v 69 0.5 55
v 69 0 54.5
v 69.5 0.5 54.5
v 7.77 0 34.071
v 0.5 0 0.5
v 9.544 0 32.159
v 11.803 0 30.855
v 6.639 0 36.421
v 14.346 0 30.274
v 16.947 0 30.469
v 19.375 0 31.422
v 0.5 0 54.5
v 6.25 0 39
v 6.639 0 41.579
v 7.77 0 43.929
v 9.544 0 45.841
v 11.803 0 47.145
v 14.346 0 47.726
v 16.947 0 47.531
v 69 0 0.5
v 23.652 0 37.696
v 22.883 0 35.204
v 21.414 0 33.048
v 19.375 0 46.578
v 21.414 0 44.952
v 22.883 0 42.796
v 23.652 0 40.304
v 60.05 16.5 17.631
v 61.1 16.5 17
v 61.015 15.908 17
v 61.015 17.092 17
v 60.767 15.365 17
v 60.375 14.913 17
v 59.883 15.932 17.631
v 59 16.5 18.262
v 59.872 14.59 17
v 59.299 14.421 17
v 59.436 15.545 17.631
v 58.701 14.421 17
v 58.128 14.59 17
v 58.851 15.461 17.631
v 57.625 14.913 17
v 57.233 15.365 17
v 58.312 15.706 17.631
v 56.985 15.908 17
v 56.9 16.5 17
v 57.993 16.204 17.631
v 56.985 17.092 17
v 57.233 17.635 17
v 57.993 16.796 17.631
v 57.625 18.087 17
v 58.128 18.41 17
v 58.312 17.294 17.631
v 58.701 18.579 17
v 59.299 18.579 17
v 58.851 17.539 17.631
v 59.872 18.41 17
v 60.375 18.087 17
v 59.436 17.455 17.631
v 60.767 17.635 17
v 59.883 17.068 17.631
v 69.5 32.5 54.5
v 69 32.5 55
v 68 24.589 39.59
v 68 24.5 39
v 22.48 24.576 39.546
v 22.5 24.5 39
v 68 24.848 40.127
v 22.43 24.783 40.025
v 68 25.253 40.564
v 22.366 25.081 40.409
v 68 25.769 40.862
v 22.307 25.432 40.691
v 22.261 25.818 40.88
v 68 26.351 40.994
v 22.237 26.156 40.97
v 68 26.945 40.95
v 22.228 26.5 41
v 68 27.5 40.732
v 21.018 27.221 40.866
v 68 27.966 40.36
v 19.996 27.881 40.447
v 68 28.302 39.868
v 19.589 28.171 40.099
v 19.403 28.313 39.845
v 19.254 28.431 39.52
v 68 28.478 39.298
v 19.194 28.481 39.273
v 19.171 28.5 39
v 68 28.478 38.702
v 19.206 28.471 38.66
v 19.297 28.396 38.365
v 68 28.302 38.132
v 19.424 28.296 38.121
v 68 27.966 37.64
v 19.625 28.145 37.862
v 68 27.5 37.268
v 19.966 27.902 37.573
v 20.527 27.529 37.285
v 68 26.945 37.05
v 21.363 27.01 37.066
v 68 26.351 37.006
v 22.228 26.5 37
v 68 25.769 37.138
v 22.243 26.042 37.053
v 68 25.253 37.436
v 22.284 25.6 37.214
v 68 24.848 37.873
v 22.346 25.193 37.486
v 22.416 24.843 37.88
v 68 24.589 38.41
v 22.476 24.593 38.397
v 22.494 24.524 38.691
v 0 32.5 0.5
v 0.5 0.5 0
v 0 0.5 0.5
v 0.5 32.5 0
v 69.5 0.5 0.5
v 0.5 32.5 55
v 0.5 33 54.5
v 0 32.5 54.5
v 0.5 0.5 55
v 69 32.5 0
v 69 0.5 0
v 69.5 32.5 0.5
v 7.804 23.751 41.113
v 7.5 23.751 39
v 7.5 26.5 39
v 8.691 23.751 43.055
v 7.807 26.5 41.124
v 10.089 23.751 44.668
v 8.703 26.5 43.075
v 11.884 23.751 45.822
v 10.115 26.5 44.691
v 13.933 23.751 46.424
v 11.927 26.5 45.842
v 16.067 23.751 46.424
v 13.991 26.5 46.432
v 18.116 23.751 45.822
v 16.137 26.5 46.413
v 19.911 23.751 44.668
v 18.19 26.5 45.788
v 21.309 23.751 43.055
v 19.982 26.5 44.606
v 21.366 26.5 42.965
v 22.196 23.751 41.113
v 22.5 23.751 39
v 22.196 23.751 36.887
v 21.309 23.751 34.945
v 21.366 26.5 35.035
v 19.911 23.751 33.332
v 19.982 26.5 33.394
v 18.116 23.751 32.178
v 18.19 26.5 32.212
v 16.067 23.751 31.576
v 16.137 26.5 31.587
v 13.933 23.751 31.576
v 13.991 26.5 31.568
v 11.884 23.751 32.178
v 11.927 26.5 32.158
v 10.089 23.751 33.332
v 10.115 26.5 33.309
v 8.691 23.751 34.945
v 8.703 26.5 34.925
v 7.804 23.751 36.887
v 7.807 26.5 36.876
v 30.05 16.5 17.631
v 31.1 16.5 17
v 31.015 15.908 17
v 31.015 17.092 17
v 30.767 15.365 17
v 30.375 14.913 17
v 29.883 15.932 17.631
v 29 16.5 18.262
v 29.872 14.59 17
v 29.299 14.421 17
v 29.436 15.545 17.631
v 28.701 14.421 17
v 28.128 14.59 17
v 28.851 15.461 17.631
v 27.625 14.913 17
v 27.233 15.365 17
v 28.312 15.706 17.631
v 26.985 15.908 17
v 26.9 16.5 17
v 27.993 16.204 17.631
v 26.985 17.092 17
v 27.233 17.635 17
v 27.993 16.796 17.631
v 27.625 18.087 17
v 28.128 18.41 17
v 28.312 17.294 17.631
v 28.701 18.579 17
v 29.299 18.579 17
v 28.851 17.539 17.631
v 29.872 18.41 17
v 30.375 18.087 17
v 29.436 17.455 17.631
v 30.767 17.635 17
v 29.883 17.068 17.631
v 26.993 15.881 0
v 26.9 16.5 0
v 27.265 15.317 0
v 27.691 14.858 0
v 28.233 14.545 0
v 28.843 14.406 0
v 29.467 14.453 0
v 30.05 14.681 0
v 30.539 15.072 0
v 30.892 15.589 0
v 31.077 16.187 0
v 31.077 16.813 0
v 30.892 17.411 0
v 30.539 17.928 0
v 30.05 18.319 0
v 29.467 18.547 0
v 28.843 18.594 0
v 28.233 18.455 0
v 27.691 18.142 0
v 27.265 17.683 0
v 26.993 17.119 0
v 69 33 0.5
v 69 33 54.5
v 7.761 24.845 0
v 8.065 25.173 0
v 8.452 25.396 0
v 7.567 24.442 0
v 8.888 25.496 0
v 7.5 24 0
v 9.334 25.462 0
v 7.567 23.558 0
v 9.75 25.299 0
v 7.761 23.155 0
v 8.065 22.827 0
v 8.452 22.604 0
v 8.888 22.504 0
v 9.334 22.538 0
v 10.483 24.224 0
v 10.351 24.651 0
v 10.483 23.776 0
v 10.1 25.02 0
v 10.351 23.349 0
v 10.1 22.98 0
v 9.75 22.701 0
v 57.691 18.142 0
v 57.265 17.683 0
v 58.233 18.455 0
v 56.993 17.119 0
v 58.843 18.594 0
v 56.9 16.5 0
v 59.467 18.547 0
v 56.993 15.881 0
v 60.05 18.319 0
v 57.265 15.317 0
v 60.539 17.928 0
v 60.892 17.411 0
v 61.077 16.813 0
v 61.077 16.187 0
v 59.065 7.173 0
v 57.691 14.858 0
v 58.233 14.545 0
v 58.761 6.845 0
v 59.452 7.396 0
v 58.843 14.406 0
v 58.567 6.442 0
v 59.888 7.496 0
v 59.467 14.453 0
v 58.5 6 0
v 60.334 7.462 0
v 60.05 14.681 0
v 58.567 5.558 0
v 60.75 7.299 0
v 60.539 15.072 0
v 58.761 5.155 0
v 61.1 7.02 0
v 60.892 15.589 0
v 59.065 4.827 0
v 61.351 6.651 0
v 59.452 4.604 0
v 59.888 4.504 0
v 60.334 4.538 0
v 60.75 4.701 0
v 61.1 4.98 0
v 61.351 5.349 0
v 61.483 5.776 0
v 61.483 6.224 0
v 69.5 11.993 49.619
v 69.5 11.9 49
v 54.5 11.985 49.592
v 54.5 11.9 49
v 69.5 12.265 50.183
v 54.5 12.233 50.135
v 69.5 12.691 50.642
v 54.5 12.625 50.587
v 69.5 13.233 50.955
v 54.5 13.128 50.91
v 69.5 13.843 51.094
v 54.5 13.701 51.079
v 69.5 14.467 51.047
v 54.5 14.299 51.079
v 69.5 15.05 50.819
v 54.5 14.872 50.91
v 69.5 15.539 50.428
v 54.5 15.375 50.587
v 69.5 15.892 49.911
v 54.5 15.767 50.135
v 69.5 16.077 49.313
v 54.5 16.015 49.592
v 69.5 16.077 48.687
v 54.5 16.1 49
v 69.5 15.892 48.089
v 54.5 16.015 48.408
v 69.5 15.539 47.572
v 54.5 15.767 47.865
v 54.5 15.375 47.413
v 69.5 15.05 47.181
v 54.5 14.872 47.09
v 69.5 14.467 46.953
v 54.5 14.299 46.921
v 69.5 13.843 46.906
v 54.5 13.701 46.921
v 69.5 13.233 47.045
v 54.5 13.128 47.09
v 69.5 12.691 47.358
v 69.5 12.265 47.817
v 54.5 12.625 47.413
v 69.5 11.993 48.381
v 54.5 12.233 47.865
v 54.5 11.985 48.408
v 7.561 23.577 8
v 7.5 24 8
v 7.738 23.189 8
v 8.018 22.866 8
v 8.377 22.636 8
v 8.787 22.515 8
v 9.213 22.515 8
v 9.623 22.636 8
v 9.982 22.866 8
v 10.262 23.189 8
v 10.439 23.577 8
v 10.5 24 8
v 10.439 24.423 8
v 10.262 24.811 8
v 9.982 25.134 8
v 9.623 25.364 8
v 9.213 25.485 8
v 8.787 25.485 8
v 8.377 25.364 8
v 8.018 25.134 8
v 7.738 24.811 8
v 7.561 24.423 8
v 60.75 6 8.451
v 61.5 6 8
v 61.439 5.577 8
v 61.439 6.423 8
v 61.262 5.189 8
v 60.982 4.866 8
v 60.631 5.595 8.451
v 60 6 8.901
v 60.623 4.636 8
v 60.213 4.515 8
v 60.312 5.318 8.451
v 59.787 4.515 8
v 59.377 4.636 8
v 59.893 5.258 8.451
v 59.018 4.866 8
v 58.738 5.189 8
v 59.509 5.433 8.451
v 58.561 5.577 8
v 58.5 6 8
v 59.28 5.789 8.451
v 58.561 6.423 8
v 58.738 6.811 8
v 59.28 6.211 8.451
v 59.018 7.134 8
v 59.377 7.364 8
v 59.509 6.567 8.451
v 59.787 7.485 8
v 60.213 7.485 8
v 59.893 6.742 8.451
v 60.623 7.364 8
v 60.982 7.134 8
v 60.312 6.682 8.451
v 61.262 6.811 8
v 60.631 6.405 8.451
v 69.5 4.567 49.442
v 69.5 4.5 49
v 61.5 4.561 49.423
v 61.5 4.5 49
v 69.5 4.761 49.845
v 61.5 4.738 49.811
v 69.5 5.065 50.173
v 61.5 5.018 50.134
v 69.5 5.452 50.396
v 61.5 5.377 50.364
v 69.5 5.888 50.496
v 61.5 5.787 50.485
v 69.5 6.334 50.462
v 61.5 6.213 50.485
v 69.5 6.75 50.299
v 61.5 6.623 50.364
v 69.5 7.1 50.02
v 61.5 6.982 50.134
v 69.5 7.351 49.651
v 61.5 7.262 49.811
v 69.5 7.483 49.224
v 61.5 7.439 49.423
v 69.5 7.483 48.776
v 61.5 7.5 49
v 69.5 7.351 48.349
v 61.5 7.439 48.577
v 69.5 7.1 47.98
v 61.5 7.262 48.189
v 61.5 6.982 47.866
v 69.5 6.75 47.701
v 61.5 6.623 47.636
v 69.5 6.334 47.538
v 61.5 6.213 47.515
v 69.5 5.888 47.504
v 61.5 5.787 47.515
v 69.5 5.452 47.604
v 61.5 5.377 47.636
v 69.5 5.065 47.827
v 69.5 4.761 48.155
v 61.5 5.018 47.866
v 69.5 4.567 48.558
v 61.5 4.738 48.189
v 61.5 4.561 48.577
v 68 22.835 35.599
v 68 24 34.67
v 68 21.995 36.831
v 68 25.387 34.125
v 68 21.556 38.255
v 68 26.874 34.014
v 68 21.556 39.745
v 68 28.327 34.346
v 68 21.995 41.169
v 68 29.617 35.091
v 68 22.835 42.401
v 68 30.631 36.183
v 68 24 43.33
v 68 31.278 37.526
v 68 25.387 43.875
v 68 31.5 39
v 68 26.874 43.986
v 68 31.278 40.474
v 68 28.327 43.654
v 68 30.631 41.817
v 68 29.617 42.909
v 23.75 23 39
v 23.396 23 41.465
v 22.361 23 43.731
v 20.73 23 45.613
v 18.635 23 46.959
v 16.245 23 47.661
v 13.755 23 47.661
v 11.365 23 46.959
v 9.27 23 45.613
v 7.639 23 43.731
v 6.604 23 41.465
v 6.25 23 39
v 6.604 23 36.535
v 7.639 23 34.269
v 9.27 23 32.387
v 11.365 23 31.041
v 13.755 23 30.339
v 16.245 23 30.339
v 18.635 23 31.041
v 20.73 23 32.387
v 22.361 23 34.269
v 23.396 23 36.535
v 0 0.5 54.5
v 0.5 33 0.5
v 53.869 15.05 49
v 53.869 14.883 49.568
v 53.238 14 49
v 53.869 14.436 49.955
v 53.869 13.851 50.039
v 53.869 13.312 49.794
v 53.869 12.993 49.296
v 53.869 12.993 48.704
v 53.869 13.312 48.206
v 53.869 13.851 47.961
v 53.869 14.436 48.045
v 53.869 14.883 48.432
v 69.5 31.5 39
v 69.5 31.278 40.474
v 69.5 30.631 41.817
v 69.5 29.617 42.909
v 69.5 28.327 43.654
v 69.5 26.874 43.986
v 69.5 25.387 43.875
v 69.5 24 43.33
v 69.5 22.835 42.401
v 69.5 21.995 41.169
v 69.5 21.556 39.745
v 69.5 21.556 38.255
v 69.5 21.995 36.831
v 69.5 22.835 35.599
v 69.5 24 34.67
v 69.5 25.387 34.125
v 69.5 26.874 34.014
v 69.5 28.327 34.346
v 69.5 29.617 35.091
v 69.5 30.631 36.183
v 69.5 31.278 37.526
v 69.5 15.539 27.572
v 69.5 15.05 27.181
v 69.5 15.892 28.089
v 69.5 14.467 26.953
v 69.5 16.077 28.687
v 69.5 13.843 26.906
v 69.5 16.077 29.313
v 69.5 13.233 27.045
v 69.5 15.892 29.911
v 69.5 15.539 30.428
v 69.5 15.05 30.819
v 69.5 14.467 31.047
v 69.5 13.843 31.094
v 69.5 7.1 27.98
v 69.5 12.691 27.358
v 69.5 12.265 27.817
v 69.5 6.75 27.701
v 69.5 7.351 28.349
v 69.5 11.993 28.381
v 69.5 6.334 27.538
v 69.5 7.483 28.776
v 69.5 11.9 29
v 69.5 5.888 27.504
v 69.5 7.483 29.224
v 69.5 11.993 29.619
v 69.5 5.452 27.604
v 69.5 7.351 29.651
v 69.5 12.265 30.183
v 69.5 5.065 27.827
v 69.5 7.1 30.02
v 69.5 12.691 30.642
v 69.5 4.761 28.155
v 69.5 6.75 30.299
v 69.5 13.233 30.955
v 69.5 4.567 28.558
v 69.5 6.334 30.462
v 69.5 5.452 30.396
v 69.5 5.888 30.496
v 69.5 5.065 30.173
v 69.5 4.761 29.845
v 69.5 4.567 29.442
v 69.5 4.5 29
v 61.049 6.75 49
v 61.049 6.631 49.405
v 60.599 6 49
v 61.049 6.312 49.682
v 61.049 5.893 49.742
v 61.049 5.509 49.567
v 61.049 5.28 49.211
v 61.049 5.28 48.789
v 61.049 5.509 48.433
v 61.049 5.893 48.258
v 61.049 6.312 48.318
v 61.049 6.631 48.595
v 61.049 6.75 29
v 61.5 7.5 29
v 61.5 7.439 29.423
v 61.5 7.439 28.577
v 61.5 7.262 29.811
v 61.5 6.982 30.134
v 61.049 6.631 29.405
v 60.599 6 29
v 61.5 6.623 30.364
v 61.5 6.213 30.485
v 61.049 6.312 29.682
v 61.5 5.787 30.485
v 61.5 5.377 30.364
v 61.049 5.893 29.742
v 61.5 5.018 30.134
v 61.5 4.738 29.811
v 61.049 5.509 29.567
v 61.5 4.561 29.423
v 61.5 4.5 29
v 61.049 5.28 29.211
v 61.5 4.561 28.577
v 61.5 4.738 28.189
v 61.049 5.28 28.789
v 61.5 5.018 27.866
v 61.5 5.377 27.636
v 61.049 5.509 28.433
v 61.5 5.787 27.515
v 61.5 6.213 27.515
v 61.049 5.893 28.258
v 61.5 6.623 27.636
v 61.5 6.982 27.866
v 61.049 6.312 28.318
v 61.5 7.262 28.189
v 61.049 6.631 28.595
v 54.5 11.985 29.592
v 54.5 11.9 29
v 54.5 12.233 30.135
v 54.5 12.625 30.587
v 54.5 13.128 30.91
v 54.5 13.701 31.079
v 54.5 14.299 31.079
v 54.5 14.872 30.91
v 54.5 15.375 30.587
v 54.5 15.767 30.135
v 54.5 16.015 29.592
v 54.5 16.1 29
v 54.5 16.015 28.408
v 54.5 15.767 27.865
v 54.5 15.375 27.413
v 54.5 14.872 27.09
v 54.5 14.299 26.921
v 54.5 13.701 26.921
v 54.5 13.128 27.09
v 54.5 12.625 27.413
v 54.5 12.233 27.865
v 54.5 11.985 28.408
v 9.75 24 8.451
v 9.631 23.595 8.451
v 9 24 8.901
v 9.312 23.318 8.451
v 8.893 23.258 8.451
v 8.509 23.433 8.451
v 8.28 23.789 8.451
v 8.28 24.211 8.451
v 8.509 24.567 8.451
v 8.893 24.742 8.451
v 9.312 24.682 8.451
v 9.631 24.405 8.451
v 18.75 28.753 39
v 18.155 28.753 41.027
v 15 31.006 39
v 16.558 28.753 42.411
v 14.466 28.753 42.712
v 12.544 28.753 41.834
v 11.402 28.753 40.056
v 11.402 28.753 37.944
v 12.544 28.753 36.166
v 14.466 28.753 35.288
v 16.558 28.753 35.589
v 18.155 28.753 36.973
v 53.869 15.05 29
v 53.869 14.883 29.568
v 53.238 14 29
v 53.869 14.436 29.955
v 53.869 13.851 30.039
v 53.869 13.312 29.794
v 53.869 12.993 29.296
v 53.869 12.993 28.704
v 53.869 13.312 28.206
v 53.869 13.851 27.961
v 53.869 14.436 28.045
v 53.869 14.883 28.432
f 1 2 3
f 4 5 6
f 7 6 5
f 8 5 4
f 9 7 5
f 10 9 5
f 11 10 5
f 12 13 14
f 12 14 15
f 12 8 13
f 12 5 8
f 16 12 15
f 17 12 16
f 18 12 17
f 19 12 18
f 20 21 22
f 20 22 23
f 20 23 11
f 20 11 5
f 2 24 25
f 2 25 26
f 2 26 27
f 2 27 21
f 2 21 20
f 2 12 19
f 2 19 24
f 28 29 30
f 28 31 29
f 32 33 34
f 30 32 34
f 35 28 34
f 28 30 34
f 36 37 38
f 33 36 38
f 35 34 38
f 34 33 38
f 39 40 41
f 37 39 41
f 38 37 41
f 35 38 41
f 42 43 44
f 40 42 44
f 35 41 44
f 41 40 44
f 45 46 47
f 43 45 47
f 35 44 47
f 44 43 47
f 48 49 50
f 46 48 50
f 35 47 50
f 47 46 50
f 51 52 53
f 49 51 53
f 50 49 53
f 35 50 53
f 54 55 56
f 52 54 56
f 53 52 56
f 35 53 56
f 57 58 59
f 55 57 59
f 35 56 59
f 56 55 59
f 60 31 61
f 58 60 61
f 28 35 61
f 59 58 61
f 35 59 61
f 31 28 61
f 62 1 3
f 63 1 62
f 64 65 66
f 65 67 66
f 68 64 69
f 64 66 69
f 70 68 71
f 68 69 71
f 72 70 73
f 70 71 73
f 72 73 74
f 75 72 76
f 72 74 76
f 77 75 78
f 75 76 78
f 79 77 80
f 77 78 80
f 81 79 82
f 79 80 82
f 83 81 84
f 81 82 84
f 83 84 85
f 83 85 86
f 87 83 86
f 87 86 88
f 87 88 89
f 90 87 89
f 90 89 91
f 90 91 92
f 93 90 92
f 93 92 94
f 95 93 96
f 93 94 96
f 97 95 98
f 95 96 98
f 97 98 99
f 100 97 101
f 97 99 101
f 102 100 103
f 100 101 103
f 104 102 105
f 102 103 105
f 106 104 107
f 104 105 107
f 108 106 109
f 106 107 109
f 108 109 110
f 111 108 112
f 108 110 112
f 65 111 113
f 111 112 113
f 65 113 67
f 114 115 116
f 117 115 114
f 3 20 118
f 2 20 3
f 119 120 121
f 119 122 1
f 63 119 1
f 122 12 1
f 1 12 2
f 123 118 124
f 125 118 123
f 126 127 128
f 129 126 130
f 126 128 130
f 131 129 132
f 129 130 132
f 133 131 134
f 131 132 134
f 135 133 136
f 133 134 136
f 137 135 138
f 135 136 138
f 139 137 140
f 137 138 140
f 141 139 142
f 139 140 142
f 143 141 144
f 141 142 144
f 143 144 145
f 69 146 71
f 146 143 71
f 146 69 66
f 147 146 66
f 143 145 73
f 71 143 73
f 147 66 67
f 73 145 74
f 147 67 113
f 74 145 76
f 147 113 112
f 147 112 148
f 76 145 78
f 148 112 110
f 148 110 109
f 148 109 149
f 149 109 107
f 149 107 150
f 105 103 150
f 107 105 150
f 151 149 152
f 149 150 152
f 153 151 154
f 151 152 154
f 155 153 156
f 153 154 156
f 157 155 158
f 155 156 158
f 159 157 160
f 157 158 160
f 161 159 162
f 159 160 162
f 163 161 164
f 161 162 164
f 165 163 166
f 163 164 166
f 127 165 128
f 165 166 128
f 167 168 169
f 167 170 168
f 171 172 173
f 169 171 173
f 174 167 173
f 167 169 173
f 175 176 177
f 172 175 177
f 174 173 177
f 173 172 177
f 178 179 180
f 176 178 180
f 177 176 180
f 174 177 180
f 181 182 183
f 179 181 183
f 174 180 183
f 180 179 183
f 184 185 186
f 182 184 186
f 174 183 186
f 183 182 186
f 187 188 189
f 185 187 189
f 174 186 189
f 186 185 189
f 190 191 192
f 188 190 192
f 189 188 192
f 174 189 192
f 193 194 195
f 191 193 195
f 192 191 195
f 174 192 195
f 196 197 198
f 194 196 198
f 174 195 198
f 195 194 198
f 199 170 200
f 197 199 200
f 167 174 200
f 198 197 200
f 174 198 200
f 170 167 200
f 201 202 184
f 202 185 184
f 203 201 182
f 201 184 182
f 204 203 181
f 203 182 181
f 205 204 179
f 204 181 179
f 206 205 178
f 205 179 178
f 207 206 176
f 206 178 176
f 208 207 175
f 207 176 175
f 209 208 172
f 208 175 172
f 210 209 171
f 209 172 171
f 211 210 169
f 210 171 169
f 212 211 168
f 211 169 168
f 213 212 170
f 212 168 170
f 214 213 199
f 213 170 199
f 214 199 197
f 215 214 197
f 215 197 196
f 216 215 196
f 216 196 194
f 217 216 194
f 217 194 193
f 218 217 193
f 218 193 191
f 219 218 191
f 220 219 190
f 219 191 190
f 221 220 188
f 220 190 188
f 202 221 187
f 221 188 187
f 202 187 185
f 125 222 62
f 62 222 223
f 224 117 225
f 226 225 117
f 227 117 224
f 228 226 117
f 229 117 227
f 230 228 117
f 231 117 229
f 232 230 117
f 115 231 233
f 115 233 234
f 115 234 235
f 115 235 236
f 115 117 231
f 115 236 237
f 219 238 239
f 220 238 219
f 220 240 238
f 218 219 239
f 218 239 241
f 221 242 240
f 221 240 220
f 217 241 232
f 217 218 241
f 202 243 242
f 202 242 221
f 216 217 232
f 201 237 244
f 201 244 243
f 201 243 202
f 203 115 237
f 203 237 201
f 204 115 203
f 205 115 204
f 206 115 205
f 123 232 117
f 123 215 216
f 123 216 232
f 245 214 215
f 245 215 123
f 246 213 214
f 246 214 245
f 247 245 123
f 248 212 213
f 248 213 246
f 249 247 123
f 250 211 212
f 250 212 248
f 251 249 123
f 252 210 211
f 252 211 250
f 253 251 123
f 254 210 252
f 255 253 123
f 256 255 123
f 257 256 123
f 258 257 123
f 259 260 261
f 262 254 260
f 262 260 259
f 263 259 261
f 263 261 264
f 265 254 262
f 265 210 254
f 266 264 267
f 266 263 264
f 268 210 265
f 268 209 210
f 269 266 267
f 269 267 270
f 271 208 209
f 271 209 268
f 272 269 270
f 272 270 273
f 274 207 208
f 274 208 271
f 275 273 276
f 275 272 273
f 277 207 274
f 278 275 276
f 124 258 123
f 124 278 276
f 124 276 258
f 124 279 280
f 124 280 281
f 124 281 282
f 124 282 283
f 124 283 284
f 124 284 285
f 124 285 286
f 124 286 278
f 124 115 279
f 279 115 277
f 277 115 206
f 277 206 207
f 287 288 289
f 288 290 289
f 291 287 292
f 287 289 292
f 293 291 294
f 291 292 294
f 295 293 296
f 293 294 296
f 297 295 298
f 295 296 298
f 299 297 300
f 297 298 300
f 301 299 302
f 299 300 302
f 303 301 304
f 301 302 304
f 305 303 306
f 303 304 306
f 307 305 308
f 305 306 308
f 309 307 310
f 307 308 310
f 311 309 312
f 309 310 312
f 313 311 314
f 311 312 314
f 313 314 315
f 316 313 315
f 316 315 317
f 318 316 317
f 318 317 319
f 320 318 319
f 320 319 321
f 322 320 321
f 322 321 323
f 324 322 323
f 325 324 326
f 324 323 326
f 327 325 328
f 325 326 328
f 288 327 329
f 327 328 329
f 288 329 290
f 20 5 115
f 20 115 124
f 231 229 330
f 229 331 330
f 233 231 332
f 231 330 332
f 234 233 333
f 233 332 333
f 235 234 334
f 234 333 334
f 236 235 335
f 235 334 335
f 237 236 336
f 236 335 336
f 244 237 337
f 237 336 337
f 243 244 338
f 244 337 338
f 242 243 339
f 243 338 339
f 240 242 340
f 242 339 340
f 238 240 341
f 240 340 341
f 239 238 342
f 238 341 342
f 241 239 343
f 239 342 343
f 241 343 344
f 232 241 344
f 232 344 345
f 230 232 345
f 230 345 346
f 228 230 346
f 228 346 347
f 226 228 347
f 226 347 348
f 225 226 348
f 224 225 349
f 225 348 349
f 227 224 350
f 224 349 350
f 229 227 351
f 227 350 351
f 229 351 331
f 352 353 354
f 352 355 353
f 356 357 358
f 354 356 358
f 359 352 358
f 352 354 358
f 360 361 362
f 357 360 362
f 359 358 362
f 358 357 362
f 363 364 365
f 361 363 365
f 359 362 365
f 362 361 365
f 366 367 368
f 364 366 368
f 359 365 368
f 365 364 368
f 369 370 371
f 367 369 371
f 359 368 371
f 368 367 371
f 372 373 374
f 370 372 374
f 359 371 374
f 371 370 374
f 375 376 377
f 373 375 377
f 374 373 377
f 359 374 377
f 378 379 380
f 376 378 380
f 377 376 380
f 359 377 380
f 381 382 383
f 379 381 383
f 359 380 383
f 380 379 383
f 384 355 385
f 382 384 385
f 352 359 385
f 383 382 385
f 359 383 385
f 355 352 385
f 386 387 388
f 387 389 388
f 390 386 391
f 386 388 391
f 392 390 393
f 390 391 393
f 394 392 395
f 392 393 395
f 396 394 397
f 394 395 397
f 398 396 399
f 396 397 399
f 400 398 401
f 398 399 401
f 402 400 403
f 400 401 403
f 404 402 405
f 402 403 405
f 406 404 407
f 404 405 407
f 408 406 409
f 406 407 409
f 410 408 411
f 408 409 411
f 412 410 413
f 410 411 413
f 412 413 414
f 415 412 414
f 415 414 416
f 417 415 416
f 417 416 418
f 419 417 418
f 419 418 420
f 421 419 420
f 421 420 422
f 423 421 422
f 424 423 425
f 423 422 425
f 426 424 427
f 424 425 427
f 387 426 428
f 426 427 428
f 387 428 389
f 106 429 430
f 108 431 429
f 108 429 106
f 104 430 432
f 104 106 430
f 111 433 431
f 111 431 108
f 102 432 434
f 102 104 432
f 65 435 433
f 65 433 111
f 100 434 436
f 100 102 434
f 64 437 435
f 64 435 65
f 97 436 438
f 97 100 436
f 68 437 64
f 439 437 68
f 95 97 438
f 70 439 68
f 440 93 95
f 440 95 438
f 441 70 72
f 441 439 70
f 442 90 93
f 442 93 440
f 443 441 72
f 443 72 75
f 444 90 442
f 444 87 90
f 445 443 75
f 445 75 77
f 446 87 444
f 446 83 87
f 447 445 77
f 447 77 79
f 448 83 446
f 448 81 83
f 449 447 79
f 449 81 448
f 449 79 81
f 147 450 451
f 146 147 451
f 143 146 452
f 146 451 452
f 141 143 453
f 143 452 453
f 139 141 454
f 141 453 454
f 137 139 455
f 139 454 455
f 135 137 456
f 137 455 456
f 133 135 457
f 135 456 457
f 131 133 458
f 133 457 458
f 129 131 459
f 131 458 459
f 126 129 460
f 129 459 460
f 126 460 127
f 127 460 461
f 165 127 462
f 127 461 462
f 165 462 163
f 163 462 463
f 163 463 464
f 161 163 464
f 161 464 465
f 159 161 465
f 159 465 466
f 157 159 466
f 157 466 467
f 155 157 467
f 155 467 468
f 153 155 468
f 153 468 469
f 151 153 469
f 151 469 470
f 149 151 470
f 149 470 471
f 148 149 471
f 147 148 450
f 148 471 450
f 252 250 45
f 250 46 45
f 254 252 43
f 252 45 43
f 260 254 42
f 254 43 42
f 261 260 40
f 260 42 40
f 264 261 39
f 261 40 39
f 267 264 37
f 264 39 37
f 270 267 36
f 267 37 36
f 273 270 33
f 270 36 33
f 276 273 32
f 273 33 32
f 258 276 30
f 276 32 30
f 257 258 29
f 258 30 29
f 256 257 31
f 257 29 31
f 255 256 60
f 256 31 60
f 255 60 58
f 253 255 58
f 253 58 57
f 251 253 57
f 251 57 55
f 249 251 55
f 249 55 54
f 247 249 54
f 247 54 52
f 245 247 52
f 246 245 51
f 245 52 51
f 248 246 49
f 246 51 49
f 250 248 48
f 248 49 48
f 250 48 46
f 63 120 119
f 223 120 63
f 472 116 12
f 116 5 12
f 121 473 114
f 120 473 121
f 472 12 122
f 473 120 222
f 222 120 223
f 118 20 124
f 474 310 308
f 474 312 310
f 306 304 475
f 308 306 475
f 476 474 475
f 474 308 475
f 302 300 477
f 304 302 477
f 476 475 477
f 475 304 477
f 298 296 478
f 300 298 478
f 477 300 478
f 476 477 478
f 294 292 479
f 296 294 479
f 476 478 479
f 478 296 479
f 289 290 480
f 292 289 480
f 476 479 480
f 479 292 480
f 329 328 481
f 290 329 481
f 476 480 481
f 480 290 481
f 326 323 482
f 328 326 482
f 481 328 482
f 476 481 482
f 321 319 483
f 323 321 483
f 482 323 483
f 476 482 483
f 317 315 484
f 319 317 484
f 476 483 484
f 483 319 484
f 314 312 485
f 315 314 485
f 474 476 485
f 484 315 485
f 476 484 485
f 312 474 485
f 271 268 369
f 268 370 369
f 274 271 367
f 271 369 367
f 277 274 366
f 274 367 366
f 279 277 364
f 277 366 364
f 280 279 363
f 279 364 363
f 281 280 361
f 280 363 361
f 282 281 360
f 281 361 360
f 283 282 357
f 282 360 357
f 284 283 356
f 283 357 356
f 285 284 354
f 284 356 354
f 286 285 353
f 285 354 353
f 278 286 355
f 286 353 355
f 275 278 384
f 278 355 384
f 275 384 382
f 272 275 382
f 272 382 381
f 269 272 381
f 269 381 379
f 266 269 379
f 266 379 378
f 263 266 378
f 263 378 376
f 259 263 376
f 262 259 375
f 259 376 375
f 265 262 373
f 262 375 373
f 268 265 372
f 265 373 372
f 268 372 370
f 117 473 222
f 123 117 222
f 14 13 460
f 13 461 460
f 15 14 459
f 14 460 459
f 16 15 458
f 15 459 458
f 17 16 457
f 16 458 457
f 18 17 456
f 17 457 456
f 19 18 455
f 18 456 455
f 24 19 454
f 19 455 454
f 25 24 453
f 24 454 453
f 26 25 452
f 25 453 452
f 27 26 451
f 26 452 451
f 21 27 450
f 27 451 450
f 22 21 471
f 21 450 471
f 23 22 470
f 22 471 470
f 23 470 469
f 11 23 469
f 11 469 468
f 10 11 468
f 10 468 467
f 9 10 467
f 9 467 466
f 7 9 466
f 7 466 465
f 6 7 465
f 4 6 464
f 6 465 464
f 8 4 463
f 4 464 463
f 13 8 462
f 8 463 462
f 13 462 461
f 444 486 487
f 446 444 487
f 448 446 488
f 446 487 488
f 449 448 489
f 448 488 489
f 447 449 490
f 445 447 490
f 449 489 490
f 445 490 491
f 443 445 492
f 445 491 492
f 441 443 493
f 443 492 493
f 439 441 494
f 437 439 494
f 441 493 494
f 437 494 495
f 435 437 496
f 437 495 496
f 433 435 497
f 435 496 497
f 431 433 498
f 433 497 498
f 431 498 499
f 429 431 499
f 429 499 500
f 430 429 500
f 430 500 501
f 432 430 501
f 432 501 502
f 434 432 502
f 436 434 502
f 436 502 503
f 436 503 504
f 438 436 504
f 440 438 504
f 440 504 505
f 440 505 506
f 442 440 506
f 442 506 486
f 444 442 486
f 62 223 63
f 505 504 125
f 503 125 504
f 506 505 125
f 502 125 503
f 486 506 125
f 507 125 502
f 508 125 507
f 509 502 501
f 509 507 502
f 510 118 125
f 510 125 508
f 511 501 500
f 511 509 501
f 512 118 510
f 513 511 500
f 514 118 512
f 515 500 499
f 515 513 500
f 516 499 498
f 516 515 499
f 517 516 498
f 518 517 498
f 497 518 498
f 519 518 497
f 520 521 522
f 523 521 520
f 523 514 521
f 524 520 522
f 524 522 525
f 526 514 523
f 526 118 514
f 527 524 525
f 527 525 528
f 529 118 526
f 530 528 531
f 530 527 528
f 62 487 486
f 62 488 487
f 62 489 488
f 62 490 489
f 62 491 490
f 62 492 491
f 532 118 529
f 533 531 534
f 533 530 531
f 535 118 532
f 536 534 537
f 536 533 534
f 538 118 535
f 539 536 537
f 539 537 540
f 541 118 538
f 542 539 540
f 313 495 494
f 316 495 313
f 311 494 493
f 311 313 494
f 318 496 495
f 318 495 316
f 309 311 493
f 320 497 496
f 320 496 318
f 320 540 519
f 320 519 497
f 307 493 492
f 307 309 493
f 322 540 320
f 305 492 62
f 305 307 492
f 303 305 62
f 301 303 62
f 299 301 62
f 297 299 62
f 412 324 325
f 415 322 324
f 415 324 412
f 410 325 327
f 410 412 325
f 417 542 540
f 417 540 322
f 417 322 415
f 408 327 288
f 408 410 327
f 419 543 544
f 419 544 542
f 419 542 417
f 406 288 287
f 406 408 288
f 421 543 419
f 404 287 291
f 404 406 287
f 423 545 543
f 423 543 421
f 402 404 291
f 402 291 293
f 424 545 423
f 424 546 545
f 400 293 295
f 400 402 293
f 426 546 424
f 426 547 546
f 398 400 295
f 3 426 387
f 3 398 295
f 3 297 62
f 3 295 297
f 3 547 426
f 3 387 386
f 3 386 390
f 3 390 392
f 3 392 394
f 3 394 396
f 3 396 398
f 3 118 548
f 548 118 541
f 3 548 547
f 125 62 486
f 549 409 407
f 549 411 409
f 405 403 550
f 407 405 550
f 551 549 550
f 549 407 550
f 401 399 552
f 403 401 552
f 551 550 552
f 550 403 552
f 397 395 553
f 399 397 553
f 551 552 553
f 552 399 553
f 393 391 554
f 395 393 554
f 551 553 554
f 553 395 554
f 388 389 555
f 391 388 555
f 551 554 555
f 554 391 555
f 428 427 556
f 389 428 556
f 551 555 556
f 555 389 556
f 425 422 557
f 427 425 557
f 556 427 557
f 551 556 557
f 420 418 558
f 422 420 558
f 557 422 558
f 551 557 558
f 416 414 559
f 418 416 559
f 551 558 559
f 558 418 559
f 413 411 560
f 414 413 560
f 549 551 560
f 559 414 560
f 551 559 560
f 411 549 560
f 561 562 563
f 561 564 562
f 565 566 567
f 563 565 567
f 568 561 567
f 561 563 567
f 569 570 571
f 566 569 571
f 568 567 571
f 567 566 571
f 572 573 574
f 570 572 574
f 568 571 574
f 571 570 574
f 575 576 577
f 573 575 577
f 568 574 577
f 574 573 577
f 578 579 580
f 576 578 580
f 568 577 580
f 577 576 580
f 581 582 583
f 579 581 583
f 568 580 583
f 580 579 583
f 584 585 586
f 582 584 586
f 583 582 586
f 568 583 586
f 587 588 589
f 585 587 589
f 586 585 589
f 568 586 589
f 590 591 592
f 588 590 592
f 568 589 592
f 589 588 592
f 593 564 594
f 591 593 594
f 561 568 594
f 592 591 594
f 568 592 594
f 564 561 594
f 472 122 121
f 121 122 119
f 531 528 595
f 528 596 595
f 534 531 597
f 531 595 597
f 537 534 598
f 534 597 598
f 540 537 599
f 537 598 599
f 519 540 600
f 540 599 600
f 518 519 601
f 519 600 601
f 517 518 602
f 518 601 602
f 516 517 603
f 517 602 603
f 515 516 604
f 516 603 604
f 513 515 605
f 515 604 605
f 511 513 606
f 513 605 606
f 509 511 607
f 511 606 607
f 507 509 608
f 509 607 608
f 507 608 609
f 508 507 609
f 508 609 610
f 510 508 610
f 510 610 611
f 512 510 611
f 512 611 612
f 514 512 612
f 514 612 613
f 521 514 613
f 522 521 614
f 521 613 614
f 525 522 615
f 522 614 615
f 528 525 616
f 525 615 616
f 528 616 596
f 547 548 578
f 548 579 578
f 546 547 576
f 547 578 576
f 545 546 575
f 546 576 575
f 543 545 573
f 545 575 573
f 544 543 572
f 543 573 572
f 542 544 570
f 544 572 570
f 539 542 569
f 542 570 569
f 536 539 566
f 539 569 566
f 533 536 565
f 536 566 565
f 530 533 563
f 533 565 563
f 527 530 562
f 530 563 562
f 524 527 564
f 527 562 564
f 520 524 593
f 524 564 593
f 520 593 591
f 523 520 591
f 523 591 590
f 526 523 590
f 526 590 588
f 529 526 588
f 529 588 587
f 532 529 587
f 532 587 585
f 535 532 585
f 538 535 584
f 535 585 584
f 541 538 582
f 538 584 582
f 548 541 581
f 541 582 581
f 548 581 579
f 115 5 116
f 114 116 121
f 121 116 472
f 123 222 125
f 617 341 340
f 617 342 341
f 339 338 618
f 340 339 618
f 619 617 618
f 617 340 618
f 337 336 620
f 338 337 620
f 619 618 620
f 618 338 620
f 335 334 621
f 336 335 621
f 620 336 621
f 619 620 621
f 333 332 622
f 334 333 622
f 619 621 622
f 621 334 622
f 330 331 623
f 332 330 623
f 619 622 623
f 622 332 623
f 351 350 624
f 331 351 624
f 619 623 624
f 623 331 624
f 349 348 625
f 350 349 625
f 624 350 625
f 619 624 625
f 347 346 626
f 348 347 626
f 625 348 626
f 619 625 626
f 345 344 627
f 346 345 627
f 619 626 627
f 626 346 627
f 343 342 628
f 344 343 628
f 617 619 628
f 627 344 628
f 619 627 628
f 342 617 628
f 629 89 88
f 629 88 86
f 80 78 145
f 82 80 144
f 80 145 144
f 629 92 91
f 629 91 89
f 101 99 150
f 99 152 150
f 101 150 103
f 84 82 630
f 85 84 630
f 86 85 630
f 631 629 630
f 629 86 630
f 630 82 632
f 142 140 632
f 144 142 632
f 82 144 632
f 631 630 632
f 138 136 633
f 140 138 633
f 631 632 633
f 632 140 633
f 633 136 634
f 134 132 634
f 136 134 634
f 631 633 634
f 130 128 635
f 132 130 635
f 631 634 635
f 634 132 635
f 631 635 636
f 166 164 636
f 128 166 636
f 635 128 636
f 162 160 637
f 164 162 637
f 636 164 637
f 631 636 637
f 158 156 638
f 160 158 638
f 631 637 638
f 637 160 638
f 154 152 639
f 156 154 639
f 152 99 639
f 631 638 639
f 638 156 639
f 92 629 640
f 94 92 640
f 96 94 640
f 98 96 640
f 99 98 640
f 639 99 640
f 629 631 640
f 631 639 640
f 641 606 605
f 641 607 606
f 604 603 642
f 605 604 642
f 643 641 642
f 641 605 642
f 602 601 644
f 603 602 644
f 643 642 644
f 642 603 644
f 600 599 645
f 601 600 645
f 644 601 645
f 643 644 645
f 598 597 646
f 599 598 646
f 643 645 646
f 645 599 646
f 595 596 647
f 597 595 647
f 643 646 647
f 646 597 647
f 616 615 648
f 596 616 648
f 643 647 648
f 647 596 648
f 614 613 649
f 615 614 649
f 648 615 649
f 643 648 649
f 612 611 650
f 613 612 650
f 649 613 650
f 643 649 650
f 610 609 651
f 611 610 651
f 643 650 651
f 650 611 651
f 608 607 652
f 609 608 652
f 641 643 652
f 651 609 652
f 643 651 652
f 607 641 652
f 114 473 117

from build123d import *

# Parameters (mm, degrees)
F0_W           = 69.5
F0_H           = 55
F1_DEPTH       = 33
F2_SIZE        = 0.5
F4_D           = 17.5
F4_DEPTH       = 23
F4_TIP         = 5.2575304165
F5_D           = 15
F5_DEPTH       = 26.5
F5_TIP         = 4.5064546427
F8_D           = 4
F8_DEPTH       = 54.5
F8_CBORE_D     = 10
F8_CBORE_DEPTH = 1.5
F8_TIP         = 1.2017212381
F9_D           = 4.2
F9_DEPTH       = 15
F9_TIP         = 1.2618073
F10_D          = 3
F10_DEPTH      = 8
F10_TIP        = 0.9012909285
F11_D          = 3
F11_DEPTH      = 8
F11_TIP        = 0.9012909285
F12_D          = 4.2
F12_DEPTH      = 17
F12_TIP        = 1.2618073


with BuildPart() as f1:
    # F0 (on Front) → F1 (new body)
    with BuildSketch(Plane.XZ):
        with Locations((34.75, 27.5)):
            Rectangle(F0_W, F0_H)
    extrude(amount=-F1_DEPTH)

    # F2
    f2_edges = [f1.edges().sort_by_distance(p)[0] for p in [
        (0, 0, 27.5),
        (34.75, 0, 0),
        (69.5, 0, 27.5),
        (34.75, 0, 55),
        (0, 33, 27.5),
        (34.75, 33, 0),
        (69.5, 33, 27.5),
        (34.75, 33, 55),
        (69.5, 16.5, 55),
        (0, 16.5, 55),
        (0, 16.5, 0),
        (69.5, 16.5, 0),
    ]]
    chamfer(f2_edges, length=F2_SIZE)

    # F4
    with Locations(Plane.XZ):
        with Locations((15, 39)):
            Hole(F4_D / 2, depth=F4_DEPTH)
            with Locations((0, 0, -(F4_DEPTH + F4_TIP / 2))):  # 118° drill point
                Cone(0, F4_D / 2, F4_TIP, mode=Mode.SUBTRACT)

    # F5
    with Locations(Plane.XZ):
        with Locations((15, 39)):
            Hole(F5_D / 2, depth=F5_DEPTH)
            with Locations((0, 0, -(F5_DEPTH + F5_TIP / 2))):  # 118° drill point
                Cone(0, F5_D / 2, F5_TIP, mode=Mode.SUBTRACT)

    # F8
    with Locations(Plane.YZ.offset(69.5)):
        with Locations((26.5, 39)):
            CounterBoreHole(F8_D / 2, F8_CBORE_D / 2, F8_CBORE_DEPTH, depth=F8_DEPTH)
            with Locations((0, 0, -(F8_DEPTH + F8_TIP / 2))):  # 118° drill point
                Cone(0, F8_D / 2, F8_TIP, mode=Mode.SUBTRACT)

    # F9
    with Locations(Plane.YZ.offset(69.5)):
        with Locations((14, 49), (14, 29)):
            Hole(F9_D / 2, depth=F9_DEPTH)
            with Locations((0, 0, -(F9_DEPTH + F9_TIP / 2))):  # 118° drill point
                Cone(0, F9_D / 2, F9_TIP, mode=Mode.SUBTRACT)

    # F10
    with Locations(Plane.YZ.offset(69.5)):
        with Locations((6, 49), (6, 29)):
            Hole(F10_D / 2, depth=F10_DEPTH)
            with Locations((0, 0, -(F10_DEPTH + F10_TIP / 2))):  # 118° drill point
                Cone(0, F10_D / 2, F10_TIP, mode=Mode.SUBTRACT)

    # F11
    with Locations(Plane(origin=(0, 0, 0), x_dir=(1, 0, 0), z_dir=(0, 0, -1))):
        with Locations((9, -24), (60, -6)):
            Hole(F11_D / 2, depth=F11_DEPTH)
            with Locations((0, 0, -(F11_DEPTH + F11_TIP / 2))):  # 118° drill point
                Cone(0, F11_D / 2, F11_TIP, mode=Mode.SUBTRACT)

    # F12
    with Locations(Plane(origin=(0, 0, 0), x_dir=(1, 0, 0), z_dir=(0, 0, -1))):
        with Locations((29, -16.5), (59, -16.5)):
            Hole(F12_D / 2, depth=F12_DEPTH)
            with Locations((0, 0, -(F12_DEPTH + F12_TIP / 2))):  # 118° drill point
                Cone(0, F12_D / 2, F12_TIP, mode=Mode.SUBTRACT)


solid = f1.part
